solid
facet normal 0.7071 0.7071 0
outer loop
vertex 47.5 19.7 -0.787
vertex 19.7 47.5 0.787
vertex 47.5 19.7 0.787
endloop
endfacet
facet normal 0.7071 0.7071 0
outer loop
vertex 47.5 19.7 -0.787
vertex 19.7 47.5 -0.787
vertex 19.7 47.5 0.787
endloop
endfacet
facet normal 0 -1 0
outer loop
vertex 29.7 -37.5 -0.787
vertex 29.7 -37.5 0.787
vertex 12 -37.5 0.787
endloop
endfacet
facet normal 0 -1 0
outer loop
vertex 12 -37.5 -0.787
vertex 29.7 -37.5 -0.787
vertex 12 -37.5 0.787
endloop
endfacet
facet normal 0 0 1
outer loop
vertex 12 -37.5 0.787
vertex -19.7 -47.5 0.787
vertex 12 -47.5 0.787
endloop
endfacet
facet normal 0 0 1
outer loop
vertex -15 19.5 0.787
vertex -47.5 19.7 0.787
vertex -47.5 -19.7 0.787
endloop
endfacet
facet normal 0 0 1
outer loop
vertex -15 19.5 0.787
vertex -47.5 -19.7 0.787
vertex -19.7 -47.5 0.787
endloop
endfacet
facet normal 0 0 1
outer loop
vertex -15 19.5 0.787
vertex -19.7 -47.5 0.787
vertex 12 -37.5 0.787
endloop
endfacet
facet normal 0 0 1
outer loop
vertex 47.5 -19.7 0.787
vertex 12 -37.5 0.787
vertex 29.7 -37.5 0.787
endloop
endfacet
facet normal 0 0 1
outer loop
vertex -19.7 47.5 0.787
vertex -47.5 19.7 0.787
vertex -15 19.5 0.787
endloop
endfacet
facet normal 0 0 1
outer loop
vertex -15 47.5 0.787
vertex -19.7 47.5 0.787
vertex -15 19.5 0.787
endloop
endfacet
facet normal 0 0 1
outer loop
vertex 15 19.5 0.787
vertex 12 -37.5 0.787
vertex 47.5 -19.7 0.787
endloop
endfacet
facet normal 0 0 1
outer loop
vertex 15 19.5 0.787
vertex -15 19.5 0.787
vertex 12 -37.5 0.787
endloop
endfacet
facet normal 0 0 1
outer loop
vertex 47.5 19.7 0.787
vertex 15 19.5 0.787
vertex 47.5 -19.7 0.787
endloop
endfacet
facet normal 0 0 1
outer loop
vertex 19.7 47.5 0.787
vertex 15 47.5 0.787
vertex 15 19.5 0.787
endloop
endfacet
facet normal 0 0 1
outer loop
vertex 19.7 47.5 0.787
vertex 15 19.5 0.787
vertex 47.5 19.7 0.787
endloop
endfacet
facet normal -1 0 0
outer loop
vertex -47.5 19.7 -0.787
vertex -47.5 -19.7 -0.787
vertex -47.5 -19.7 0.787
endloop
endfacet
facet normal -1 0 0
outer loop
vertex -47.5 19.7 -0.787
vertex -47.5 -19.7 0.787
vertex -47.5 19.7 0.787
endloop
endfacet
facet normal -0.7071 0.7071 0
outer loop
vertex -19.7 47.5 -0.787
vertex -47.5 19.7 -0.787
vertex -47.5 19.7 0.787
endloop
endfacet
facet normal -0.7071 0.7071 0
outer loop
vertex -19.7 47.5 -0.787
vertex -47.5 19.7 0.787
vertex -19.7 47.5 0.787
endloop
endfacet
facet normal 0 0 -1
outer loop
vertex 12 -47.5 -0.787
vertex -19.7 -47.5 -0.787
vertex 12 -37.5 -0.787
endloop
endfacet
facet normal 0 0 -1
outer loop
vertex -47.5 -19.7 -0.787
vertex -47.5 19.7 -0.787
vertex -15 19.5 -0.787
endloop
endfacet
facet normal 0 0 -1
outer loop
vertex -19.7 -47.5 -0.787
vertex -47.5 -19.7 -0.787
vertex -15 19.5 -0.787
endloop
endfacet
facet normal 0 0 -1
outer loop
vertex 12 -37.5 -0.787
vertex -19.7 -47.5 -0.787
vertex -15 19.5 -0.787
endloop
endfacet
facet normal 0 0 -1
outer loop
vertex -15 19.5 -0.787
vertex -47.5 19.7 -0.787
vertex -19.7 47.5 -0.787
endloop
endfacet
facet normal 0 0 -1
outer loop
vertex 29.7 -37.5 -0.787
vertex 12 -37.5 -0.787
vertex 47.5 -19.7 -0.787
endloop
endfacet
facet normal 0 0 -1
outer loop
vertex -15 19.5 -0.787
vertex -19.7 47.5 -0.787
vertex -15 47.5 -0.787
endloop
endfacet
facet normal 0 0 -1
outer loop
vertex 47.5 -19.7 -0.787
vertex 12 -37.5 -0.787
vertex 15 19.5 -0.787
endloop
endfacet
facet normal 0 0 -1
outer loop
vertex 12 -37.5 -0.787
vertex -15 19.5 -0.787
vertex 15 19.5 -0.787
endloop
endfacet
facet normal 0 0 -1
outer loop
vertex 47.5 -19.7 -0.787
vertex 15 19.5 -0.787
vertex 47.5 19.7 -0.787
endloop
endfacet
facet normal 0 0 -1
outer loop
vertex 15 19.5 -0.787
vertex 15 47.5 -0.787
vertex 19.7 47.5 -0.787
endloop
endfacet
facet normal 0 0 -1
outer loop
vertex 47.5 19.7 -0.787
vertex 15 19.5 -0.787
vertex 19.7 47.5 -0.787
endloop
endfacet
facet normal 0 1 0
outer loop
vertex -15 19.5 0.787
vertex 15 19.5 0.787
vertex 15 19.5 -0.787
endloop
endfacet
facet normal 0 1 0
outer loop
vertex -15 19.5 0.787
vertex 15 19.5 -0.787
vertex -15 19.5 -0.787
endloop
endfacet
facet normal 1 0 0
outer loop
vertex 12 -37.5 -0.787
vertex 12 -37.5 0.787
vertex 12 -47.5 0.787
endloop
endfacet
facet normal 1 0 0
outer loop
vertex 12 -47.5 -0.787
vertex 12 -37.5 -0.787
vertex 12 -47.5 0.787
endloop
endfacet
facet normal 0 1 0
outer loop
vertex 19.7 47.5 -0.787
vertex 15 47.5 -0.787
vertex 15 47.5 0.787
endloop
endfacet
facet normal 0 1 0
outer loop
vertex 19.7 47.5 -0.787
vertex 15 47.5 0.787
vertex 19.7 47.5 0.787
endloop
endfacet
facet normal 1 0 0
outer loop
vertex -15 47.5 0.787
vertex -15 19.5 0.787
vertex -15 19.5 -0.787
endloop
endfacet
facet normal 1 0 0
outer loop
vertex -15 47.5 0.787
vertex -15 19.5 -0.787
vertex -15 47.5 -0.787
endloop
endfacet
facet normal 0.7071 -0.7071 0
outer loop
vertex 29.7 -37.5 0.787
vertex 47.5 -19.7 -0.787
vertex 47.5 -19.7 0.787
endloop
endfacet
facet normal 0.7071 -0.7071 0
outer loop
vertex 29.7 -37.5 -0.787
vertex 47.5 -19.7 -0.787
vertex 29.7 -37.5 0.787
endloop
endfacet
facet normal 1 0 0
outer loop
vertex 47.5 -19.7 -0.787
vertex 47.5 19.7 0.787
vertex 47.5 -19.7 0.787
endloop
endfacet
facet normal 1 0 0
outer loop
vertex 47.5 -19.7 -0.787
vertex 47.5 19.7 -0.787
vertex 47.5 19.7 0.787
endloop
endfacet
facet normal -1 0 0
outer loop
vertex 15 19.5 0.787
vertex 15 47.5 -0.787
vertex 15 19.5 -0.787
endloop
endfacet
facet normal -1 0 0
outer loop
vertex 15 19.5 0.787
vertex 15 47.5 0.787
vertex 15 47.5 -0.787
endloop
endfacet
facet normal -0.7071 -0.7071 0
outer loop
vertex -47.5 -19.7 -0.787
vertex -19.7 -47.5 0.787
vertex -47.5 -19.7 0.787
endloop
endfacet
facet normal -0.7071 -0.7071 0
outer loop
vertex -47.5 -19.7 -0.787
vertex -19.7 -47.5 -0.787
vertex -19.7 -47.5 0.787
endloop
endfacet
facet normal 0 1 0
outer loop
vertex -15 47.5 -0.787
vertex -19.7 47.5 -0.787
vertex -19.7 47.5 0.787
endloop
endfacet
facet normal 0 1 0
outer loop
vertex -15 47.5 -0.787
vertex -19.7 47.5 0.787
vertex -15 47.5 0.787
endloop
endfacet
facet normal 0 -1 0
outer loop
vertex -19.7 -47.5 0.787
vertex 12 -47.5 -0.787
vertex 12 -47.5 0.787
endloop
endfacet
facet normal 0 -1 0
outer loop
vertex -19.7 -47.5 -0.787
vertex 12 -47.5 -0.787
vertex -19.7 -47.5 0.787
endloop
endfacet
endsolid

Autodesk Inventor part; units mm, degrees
ref_plane "YZ Plane" through (0, 0, 0) normal (1, 0, 0) x (0, 1, 0)
ref_plane "XZ Plane" through (0, 0, 0) normal (0, 1, 0) x (-1, 0, 0)
ref_plane "XY Plane" through (0, 0, 0) normal (0, 0, 1) x (1, 0, 0)
sketch "Sketch1" plane through (0, 0, 0) normal (0, 0, 1) x (1, 0, 0)
  line L0 (0, 0) -> (0, 24.8008)
  line L1 (0, 0) -> (23.5103, 0)
  line L2 (-19.7, 47.5) -> (19.7, 47.5)
  line L3 (47.5, 19.7) -> (47.5, -19.7)
  line L4 (19.7, -47.5) -> (-19.7, -47.5)
  line L5 (-47.5, -19.7) -> (-47.5, 19.7)
  line L6 (19.7, 47.5) -> (47.5, 19.7)
  line L7 (47.5, -19.7) -> (19.7, -47.5)
  line L8 (-19.7, -47.5) -> (-47.5, -19.7)
  line L9 (-47.5, 19.7) -> (-19.7, 47.5)
  point P0 (-47.5, 47.5)
  point P1 (47.5, -47.5)
  point P2 (47.5, 47.5)
  point P3 (-47.5, -47.5)
  dimension "d9" = 27.8
  dimension "d10" = 27.8
  dimension "d11" = 27.8
  dimension "d12" = 27.8
  dimension "d13" = 27.8
  dimension "d14" = 27.8
  dimension "d15" = 27.8
  dimension "d16" = 27.8
  dimension "d17" = 95
  dimension "d18" = 95
extrude "Extrusion1" add sketch "Sketch1" along normal mid plane 1.5748
sketch "Sketch2" plane through (0, 0, 0.7874) normal (0, 0, 1) x (1, 0, 0)
  line L0 (0, 0) -> (0, 42.1348)
  line L1 (-15, 47.5) -> (15, 47.5)
  line L2 (15, 47.5) -> (15, 19.5)
  line L3 (15, 19.5) -> (-15, 19.5)
  line L4 (-15, 19.5) -> (-15, 47.5)
  line L5 (-19.7, 47.5) -> (19.7, 47.5) projected
  dimension "d4" = 30
  dimension "d25" = 28
extrude "Extrusion2" cut sketch "Sketch2" against normal through all
sketch "Sketch3" plane through (0, 0, 0.7874) normal (0, 0, 1) x (1, 0, 0)
  line L0 (19.7, -47.5) -> (-19.7, -47.5) projected
  line L1 (12, -47.5) -> (32, -47.5)
  line L2 (32, -47.5) -> (32, -37.5)
  line L3 (32, -37.5) -> (12, -37.5)
  line L4 (12, -37.5) -> (12, -47.5)
  point P0 (0, 0)
  dimension "d19" = 10
  dimension "d21" = 12
  dimension "d24" = 32
extrude "Extrusion3" cut sketch "Sketch3" against normal through all
equation "\"d10\" = d9"
equation "\"d11\" = d9"
equation "\"d12\" = d11"
equation "\"d13\" = d9"
equation "\"d14\" = d13"
equation "\"d15\" = d9"
equation "\"d16\" = d15"
properties part number "Tant_Exp4_top" material "Lead"
